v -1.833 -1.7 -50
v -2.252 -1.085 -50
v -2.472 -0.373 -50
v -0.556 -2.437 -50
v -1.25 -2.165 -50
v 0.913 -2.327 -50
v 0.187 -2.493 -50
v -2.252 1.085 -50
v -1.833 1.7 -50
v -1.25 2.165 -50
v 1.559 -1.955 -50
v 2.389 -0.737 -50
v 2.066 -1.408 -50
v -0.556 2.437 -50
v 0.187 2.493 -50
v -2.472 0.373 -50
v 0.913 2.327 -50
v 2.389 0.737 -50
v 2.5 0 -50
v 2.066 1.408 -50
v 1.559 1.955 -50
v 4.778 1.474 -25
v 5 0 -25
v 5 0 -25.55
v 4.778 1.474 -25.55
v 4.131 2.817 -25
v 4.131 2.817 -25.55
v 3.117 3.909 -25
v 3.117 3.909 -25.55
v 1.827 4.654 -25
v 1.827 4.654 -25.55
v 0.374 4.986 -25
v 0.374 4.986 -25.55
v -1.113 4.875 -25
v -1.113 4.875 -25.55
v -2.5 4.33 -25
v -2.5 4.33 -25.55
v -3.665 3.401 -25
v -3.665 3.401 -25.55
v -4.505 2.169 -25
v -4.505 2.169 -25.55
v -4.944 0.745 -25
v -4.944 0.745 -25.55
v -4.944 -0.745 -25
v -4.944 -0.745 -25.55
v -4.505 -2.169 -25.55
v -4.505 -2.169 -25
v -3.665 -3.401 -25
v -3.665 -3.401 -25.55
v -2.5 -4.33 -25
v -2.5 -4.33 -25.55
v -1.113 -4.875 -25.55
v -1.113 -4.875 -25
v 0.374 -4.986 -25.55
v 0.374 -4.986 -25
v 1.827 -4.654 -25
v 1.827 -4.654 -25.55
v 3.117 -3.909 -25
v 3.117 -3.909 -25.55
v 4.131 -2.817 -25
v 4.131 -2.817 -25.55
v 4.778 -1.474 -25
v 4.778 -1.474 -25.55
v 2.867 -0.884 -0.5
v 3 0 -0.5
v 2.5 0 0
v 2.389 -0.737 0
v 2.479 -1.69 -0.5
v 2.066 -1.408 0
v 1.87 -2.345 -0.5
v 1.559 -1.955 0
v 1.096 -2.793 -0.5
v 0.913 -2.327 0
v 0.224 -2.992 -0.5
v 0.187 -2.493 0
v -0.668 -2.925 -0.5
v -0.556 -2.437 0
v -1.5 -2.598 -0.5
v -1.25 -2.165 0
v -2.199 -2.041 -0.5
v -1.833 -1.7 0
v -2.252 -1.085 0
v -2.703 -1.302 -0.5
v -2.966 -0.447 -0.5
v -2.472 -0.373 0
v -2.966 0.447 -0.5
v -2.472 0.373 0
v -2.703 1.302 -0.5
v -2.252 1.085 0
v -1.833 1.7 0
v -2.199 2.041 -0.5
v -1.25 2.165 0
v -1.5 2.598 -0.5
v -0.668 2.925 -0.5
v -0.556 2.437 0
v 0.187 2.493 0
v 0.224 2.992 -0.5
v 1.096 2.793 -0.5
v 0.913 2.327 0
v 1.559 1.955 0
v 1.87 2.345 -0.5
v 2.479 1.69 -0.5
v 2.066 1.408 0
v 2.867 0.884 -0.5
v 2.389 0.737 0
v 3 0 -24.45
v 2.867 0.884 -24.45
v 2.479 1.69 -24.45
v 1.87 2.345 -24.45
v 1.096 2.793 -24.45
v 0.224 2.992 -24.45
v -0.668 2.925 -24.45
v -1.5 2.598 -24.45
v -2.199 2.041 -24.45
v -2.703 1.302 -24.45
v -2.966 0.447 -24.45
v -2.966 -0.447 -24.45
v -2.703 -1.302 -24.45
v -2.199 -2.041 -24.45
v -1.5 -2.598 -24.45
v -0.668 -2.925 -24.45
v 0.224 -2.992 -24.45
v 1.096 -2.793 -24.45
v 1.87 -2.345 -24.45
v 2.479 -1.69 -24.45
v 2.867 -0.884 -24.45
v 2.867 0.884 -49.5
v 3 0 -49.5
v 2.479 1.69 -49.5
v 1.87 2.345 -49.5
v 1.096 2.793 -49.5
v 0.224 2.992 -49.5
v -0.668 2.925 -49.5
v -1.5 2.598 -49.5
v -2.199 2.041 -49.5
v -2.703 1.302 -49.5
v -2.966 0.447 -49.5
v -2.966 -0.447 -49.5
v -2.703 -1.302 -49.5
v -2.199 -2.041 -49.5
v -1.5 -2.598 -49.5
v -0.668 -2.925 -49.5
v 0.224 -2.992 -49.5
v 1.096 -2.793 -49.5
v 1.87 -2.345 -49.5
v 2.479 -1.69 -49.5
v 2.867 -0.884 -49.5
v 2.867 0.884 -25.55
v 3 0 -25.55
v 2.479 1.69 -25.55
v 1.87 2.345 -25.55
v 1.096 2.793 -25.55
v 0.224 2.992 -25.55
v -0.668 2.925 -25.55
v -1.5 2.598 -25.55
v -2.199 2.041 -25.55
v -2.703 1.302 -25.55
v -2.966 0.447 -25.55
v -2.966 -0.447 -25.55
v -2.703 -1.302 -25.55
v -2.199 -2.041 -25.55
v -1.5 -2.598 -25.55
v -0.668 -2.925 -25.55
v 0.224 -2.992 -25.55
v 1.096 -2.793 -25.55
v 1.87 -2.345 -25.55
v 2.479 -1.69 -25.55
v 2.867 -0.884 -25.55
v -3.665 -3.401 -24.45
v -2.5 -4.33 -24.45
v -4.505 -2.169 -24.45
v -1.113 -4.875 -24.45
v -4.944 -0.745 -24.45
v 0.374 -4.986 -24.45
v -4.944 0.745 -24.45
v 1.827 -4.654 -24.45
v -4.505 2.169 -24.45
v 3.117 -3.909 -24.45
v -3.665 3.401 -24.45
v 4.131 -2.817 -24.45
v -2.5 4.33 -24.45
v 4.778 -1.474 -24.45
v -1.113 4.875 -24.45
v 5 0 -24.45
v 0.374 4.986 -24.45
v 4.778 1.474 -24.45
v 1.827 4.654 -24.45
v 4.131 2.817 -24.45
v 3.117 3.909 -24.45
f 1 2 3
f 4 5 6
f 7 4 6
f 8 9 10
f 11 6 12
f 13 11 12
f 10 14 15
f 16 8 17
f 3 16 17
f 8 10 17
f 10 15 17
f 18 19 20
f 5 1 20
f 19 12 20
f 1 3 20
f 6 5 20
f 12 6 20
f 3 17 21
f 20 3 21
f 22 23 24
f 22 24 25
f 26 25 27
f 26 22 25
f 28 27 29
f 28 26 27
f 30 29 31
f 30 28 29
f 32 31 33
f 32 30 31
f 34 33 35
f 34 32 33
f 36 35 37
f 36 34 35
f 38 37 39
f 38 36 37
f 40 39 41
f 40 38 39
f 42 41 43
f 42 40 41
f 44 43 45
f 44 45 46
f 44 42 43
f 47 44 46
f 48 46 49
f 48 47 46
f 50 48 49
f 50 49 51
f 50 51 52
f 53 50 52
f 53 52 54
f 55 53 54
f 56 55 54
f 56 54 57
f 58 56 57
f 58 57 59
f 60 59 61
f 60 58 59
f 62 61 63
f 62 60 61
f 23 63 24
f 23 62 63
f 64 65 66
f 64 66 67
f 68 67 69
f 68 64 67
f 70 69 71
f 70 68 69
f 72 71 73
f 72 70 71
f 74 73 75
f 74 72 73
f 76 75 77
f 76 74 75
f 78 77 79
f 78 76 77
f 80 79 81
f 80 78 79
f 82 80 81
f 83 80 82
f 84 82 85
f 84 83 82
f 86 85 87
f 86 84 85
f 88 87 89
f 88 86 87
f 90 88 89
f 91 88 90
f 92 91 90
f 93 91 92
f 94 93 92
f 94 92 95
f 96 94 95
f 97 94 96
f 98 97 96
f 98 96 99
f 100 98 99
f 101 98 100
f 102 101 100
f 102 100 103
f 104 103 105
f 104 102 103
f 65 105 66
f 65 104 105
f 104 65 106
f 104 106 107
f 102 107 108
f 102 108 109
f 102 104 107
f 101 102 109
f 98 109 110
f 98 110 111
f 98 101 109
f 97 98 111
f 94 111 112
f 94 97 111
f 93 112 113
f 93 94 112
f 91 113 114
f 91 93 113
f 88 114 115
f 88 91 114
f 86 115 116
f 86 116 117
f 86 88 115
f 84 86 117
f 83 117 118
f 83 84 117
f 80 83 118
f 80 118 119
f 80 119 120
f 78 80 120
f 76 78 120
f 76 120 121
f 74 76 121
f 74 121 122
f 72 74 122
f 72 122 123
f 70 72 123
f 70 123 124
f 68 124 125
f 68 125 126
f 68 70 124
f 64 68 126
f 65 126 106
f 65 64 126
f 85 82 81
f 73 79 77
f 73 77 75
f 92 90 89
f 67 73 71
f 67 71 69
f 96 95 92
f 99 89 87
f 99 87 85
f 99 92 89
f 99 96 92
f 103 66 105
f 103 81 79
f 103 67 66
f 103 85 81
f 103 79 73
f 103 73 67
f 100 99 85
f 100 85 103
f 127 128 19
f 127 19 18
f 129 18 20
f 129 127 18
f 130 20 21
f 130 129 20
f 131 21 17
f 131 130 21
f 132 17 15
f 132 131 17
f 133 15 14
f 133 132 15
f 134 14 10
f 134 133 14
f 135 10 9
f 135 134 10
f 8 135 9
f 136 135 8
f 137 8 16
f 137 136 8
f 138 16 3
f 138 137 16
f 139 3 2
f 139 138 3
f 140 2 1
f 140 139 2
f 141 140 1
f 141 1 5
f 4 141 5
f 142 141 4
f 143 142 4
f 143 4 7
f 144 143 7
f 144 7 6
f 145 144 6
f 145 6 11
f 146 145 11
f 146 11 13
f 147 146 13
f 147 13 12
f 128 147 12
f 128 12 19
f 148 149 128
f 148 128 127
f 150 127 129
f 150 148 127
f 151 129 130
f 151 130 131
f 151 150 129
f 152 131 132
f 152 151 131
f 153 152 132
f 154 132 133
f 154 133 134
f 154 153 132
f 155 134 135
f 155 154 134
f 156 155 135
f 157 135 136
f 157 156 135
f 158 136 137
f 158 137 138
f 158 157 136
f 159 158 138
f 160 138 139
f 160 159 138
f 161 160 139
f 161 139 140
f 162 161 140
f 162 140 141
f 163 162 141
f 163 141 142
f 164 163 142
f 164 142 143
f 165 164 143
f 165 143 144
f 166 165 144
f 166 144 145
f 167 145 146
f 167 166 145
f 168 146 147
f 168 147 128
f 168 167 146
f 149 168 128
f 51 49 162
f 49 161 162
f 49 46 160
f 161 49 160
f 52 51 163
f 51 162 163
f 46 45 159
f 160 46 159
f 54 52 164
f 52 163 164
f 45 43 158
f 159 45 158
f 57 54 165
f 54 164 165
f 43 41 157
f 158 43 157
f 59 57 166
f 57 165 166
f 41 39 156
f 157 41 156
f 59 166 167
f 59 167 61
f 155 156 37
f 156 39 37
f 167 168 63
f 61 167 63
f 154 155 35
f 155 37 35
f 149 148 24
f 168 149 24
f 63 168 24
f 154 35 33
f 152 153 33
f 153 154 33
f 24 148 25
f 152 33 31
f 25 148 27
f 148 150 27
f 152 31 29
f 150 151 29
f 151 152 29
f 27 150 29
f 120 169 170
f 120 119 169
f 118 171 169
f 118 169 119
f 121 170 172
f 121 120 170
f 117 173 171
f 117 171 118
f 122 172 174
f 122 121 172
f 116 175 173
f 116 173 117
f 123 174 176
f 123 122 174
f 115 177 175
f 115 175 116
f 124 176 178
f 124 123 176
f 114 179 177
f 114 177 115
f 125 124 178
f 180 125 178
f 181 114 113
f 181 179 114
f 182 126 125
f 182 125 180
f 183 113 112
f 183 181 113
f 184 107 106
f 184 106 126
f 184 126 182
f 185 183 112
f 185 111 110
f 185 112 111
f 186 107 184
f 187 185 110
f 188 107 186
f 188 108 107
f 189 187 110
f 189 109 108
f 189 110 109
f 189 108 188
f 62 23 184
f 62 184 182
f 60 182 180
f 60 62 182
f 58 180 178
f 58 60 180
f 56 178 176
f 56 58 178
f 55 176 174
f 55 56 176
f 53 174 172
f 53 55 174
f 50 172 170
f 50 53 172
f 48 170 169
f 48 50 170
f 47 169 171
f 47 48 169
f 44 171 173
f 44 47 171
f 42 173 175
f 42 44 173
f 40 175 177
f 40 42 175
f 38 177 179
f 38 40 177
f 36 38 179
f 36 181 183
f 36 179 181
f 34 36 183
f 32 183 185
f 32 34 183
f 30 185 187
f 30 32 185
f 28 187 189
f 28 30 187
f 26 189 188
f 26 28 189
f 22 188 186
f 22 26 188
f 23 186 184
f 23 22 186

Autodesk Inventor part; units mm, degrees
ref_plane "YZ Plane" through (0, 0, 0) normal (1, 0, 0) x (0, 1, 0)
ref_plane "XZ Plane" through (0, 0, 0) normal (0, 1, 0) x (-1, 0, 0)
ref_plane "XY Plane" through (0, 0, 0) normal (0, 0, 1) x (1, 0, 0)
sketch "Sketch1" plane through (0, 0, 0) normal (0, 0, 1) x (1, 0, 0)
  circle A0 centre (0, 0) radius 3
  dimension "d0" = 6
extrude "Extrusion1" add sketch "Sketch1" against normal blind 50
ref_plane "Work Plane1" through (0, 0, -25) normal (0, 0, 1) x (1, 0, 0)
sketch "Sketch2" plane through (0, 0, -25) normal (0, 0, 1) x (1, 0, 0)
  circle A0 centre (0, 0) radius 3 projected
  circle A1 centre (0, 0) radius 3 projected
  circle A2 centre (0, 0) radius 5
  dimension "d3" = 10
extrude "Extrusion2" add sketch "Sketch2" along normal mid plane 1.1
chamfer "Chamfer1" distance 0.5 angle 45 2 edges at (-3, 0, 0) (-3, 0, -50)
properties part number "23-225Z2" material "Stainless Steel"
